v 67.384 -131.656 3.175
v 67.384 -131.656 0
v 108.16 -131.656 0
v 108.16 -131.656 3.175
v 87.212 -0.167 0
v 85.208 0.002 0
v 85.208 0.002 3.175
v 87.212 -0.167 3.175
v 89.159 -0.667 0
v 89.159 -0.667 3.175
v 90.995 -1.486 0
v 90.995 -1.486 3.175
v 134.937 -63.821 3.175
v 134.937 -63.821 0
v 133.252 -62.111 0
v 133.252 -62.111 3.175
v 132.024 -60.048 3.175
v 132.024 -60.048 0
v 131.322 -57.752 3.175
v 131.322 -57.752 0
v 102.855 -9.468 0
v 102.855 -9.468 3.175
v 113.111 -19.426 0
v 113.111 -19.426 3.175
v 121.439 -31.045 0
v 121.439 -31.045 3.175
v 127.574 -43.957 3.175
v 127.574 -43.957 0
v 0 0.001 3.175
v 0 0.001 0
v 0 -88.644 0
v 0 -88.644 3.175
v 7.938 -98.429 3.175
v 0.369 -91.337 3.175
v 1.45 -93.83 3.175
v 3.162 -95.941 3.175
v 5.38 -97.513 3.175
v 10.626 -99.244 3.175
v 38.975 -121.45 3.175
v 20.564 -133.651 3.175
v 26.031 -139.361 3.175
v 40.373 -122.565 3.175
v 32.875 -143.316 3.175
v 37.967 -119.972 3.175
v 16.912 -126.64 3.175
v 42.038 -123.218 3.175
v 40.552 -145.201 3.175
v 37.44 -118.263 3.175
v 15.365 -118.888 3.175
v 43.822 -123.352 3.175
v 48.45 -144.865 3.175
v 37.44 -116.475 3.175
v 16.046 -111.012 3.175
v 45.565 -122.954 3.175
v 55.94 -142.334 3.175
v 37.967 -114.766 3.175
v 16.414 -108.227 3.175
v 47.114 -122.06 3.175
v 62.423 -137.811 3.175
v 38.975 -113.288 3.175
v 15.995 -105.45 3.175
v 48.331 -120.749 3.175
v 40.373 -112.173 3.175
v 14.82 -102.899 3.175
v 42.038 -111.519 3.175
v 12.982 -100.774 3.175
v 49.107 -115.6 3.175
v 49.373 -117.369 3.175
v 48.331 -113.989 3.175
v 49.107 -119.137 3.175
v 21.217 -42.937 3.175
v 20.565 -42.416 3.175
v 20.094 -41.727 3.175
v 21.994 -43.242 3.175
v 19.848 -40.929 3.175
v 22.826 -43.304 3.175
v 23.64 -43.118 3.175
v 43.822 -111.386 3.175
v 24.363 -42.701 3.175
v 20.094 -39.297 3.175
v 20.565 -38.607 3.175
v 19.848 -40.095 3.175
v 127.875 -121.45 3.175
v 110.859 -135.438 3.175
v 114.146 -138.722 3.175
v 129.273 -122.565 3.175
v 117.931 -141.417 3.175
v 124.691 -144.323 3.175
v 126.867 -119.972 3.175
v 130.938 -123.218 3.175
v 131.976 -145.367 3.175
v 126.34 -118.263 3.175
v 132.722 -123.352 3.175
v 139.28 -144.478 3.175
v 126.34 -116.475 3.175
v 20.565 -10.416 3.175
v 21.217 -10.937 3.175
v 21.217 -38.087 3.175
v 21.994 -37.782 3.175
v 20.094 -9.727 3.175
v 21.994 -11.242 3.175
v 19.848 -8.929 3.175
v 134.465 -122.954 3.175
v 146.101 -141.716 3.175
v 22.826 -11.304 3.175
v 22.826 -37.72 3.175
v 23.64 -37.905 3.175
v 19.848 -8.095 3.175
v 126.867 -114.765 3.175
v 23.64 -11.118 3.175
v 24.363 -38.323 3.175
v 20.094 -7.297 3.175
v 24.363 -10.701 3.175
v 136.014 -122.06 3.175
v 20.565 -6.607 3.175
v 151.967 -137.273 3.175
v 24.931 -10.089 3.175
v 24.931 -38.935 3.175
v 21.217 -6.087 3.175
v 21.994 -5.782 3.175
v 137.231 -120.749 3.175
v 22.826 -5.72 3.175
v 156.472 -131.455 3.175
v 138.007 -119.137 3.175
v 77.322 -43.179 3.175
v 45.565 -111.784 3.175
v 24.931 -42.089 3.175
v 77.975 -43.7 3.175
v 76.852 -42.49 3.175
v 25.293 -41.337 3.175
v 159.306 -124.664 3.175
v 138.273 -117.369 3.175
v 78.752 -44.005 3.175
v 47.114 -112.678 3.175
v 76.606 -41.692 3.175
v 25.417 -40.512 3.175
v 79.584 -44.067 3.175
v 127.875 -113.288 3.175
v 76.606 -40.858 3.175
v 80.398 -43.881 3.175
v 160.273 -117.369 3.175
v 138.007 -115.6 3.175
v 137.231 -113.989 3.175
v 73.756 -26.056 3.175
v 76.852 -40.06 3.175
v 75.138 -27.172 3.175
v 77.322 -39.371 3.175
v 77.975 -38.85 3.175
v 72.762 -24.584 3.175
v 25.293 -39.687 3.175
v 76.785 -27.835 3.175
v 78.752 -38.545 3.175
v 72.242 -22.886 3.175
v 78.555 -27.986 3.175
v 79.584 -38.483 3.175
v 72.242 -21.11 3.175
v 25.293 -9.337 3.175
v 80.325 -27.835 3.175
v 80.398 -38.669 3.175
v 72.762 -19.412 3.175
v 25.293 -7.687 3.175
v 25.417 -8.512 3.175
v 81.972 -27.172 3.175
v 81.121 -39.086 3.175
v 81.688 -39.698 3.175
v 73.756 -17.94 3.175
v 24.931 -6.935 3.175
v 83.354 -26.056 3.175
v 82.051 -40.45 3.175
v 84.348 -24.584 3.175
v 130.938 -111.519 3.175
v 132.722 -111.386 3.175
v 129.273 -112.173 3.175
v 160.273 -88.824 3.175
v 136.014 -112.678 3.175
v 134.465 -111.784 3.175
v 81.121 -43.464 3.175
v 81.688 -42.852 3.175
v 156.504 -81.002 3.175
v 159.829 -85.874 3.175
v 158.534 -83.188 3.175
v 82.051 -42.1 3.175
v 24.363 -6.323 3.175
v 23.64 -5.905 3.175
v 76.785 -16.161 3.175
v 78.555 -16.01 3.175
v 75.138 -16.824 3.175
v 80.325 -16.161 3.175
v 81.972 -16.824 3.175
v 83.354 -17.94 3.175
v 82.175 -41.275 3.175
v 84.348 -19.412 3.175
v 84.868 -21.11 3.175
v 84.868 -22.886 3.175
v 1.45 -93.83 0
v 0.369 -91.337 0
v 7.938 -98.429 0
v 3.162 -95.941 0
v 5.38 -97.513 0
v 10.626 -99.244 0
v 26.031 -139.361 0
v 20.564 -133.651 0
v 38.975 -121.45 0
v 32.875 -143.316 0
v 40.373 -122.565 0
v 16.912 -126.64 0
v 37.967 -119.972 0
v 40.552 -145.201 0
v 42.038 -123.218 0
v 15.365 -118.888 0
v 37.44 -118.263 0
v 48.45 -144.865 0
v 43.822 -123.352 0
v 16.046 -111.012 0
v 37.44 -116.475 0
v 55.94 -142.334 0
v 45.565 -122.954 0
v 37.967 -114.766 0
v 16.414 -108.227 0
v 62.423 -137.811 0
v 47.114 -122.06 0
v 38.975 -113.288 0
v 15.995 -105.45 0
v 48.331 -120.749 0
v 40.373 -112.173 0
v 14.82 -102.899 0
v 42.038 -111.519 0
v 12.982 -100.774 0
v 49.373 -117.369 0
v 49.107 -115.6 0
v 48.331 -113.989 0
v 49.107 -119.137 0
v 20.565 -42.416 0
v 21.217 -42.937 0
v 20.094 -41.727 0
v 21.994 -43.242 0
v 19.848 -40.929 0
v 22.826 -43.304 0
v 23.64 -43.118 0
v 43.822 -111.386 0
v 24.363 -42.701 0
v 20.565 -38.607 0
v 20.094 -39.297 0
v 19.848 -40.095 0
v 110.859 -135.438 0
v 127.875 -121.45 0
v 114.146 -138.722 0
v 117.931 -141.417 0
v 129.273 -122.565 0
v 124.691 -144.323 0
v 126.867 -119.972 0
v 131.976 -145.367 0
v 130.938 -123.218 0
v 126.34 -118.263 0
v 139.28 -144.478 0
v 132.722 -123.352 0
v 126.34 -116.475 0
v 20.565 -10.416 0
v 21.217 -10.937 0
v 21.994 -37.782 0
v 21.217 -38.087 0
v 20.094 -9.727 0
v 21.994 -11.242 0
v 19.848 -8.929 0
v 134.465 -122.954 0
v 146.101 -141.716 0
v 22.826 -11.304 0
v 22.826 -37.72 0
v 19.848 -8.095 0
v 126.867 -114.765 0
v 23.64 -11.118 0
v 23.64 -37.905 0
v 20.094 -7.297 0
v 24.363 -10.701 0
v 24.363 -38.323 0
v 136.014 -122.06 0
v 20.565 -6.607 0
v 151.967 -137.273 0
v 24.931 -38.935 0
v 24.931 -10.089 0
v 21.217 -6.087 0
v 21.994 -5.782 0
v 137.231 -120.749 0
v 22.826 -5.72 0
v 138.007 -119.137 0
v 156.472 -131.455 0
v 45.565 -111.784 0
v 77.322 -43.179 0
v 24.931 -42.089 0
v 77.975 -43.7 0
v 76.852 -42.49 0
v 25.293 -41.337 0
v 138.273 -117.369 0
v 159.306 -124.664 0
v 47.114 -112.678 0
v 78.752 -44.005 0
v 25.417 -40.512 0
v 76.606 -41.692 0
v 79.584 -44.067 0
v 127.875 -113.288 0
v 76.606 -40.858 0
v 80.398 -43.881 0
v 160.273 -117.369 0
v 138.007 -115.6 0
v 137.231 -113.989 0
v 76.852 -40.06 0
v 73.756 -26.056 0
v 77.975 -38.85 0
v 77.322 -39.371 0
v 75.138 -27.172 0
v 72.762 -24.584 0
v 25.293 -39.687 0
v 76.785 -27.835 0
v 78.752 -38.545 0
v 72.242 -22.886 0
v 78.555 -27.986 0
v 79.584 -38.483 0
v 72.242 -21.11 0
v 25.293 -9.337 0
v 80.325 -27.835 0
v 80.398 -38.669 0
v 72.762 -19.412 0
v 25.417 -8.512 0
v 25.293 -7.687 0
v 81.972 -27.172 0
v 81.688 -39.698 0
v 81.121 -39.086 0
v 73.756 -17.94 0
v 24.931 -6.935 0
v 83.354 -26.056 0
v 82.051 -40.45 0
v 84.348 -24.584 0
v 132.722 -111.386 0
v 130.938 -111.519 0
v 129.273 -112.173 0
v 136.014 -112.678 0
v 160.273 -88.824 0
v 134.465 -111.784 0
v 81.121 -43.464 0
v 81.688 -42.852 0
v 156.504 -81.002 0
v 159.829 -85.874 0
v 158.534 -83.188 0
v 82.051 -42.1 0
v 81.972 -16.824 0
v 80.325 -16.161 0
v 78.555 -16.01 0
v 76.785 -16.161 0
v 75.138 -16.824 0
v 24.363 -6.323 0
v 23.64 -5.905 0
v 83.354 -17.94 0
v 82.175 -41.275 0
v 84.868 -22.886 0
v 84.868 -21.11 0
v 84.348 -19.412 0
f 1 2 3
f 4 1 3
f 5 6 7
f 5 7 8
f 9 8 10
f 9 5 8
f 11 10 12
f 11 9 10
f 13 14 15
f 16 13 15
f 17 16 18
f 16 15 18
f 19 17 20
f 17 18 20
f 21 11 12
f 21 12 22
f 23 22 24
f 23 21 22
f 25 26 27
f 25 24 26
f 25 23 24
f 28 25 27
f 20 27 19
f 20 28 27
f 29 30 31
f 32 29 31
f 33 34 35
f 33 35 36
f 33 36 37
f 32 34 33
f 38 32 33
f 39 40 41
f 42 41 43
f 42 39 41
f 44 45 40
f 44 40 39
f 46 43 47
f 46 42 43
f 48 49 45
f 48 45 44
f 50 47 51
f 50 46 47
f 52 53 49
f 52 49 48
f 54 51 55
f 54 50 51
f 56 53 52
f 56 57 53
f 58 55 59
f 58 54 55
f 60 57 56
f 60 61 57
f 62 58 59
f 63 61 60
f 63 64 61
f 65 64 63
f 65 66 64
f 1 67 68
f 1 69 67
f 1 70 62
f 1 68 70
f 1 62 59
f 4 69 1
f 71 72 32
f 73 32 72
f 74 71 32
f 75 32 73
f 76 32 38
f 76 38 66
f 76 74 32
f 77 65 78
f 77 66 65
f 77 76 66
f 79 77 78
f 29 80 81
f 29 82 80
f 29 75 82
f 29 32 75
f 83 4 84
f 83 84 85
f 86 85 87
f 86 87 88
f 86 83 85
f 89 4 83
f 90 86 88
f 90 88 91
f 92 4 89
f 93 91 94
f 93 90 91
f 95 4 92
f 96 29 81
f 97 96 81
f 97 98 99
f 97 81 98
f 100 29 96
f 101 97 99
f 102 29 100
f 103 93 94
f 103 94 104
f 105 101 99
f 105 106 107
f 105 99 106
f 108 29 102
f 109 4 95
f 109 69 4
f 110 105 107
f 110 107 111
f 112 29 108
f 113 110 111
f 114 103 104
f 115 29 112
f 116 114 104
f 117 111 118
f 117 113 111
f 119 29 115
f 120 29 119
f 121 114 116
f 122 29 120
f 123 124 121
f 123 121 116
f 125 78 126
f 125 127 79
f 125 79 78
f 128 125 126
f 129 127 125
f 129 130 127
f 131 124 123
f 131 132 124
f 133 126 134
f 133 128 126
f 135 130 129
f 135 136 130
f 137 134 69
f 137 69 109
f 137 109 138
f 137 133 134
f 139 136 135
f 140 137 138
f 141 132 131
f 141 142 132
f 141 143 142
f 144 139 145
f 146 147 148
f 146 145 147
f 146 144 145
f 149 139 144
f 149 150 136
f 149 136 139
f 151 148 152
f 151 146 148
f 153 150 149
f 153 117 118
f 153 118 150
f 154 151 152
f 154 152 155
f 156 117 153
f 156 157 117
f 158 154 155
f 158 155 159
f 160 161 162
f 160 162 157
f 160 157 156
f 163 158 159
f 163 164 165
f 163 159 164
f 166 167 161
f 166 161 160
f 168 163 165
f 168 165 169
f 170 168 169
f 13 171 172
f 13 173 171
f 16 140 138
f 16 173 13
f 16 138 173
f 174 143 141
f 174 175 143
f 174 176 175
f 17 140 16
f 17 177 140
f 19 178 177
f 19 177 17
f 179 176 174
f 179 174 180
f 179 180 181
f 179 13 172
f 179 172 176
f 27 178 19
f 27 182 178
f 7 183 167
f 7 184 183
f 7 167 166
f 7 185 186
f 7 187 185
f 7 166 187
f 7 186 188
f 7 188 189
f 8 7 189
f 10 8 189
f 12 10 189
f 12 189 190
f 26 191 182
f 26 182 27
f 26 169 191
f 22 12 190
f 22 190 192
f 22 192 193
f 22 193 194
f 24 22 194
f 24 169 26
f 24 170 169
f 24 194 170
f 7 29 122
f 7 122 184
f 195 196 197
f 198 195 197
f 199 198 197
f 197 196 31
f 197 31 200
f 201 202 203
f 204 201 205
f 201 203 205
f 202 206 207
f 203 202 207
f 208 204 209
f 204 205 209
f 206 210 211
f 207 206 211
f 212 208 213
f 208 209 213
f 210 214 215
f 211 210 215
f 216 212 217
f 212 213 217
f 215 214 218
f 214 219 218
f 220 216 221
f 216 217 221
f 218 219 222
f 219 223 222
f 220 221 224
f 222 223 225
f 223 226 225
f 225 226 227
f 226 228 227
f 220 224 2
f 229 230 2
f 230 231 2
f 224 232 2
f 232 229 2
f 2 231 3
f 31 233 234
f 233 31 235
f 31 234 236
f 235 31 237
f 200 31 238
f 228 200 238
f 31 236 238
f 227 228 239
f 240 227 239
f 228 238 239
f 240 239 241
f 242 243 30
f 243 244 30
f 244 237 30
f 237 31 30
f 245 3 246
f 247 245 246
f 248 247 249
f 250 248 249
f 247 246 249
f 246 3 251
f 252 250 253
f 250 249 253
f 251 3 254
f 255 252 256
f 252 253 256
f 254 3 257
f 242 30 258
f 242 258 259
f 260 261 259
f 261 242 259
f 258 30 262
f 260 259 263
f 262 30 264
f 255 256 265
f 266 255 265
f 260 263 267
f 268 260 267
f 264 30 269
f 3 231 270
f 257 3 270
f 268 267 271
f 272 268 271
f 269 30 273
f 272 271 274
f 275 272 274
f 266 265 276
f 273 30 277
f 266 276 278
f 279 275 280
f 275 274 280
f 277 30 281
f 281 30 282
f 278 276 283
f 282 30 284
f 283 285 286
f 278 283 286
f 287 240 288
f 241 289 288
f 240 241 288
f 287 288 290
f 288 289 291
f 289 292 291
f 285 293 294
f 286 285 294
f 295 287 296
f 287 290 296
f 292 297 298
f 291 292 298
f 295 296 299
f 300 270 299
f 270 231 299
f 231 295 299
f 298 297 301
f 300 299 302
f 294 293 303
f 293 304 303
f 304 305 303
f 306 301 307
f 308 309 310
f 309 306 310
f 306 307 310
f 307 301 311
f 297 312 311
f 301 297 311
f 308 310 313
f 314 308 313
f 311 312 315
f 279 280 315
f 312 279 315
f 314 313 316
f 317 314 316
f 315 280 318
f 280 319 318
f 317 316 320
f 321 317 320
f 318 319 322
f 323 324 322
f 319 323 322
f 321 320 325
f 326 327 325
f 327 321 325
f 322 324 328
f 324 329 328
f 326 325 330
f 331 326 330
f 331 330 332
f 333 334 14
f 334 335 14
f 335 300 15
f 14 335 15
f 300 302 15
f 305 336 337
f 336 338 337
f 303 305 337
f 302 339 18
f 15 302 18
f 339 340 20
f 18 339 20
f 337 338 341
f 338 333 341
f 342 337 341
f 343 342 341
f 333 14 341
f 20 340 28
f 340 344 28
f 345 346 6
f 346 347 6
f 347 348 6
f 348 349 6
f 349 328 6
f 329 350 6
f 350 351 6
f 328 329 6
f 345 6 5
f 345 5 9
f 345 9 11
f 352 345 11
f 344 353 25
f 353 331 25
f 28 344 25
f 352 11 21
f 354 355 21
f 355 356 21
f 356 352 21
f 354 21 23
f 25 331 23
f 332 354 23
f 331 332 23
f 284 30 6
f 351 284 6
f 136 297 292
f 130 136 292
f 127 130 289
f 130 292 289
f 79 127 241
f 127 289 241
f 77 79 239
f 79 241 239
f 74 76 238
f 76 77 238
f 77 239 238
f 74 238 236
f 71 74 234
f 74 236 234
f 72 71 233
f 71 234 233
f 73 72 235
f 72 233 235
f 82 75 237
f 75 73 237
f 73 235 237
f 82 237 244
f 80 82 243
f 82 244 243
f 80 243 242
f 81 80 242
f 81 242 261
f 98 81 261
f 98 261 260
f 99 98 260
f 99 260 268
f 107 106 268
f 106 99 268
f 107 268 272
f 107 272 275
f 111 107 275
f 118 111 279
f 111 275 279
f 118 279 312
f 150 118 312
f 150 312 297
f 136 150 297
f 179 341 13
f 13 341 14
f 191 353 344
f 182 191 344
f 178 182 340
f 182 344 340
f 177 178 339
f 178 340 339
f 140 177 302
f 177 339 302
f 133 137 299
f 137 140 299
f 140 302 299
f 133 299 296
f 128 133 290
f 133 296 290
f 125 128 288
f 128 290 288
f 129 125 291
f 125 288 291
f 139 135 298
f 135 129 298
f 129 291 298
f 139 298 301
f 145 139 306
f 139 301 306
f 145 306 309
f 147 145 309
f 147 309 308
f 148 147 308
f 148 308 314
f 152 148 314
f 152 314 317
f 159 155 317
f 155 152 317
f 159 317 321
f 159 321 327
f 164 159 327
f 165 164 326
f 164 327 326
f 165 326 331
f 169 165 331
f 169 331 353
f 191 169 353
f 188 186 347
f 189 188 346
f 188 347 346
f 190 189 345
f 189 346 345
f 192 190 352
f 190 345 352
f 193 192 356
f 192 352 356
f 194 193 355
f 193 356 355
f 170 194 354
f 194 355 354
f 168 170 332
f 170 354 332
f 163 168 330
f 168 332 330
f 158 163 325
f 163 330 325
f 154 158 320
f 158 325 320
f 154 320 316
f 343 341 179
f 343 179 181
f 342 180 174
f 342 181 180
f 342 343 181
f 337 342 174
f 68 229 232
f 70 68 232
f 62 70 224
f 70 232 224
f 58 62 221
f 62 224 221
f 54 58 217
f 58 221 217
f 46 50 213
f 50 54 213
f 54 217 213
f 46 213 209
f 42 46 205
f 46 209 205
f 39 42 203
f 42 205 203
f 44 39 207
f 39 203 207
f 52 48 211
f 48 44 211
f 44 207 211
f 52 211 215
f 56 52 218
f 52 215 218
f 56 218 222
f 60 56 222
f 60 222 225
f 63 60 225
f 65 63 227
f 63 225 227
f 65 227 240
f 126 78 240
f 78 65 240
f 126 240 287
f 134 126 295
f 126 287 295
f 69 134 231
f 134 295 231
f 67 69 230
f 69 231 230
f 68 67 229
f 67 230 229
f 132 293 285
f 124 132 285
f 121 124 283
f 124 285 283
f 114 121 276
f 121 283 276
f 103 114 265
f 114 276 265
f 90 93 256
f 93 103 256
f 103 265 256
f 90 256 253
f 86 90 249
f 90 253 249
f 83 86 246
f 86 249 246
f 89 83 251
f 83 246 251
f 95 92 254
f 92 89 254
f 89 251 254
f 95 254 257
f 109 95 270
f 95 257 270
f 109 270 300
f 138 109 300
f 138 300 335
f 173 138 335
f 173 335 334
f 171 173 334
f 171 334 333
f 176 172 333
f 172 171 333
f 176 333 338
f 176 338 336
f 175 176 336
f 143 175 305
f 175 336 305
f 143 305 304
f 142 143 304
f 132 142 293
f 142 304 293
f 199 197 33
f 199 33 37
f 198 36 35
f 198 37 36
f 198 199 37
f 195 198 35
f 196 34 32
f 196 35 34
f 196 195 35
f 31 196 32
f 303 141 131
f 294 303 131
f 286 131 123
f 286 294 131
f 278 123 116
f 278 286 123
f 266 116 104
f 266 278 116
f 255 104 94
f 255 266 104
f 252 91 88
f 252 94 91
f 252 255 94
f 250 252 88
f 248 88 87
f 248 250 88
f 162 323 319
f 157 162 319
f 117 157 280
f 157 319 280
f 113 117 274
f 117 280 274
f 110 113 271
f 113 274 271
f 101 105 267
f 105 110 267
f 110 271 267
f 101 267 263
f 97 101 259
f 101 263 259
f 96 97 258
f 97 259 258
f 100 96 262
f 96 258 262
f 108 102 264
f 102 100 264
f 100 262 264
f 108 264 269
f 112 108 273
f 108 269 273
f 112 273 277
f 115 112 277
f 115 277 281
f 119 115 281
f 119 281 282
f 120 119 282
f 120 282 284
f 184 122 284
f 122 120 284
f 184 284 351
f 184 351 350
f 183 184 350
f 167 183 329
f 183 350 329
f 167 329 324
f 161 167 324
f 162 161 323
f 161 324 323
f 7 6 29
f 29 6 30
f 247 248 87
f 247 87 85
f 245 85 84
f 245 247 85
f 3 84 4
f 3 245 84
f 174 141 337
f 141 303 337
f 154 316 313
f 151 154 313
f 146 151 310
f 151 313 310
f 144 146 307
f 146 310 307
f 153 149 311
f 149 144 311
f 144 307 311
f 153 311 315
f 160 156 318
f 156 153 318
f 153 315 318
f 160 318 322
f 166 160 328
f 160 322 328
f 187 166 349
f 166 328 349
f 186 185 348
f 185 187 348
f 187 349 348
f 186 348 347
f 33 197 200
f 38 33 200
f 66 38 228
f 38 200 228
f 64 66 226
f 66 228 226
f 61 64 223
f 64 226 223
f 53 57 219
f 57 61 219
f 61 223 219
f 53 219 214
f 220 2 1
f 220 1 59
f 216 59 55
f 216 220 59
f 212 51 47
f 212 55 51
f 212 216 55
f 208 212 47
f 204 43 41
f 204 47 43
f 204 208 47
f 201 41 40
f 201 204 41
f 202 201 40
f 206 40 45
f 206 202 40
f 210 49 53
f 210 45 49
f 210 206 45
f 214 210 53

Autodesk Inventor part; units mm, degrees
ref_plane "YZ Plane" through (0, 0, 0) normal (1, 0, 0) x (0, 1, 0)
ref_plane "XZ Plane" through (0, 0, 0) normal (0, 1, 0) x (-1, 0, 0)
ref_plane "XY Plane" through (0, 0, 0) normal (0, 0, 1) x (1, 0, 0)
sketch "Sketch1" plane through (0, 0, 0) normal (0, 0, 1) x (1, 0, 0)
  line L0 (90.4273, 0.002) -> (0, 0.002)
  line L1 (0, 0.002) -> (0, -88.6441)
  arc A0 (0, -88.6441) -> (7.9382, -98.4293) centre (10, -88.6441) ccw
  arc A1 (16.0457, -111.012) -> (7.9382, -98.4293) centre (6.4076, -108.3189) ccw
  arc A2 (145.7944, -114.2869) -> (148.0953, -110.4201) centre (146.9707, -112.3688) ccw
  circle A3 centre (97.4707, -122.3689) radius 2.25
  circle A4 centre (97.4707, -112.3689) radius 2.25
  circle A5 centre (78.1758, -122.3689) radius 2.25
  arc A6 (145.7944, -124.2869) -> (148.0953, -120.4201) centre (146.9707, -122.3689) ccw
  circle A7 centre (22.6171, -8.5119) radius 2.8
  circle A8 centre (22.6171, -40.5119) radius 2.8
  circle A9 centre (28.6758, -122.3689) radius 2.25
  circle A10 centre (28.6758, -112.3689) radius 2.25
  circle A11 centre (78.1758, -112.3689) radius 2.25
  circle A12 centre (78.9344, -21.998) radius 3.25
  circle A13 centre (10, -90.6616) radius 3.3
  line L2 (73.0605, -128.2915) -> (33.527, -128.2915)
  arc A14 (32.527, -127.2915) -> (33.527, -128.2915) centre (33.527, -127.2915) ccw
  line L3 (32.527, -127.2915) -> (32.527, -107.4915)
  arc A15 (33.527, -106.4915) -> (32.527, -107.4915) centre (33.527, -107.4915) ccw
  line L4 (33.527, -106.4915) -> (73.0605, -106.4915)
  arc A16 (74.0605, -107.4915) -> (73.0605, -106.4915) centre (73.0605, -107.4915) ccw
  line L5 (74.0605, -107.4915) -> (74.0605, -127.2915)
  arc A17 (73.0605, -128.2915) -> (74.0605, -127.2915) centre (73.0605, -127.2915) ccw
  line L6 (142.1195, -128.2915) -> (102.586, -128.2915)
  arc A18 (101.586, -127.2915) -> (102.586, -128.2915) centre (102.586, -127.2915) ccw
  line L7 (101.586, -127.2915) -> (101.586, -107.4915)
  arc A19 (102.586, -106.4915) -> (101.586, -107.4915) centre (102.586, -107.4915) ccw
  line L8 (102.586, -106.4915) -> (142.1195, -106.4915)
  arc A20 (143.1195, -107.4915) -> (142.1195, -106.4915) centre (142.1195, -107.4915) ccw
  line L9 (143.1195, -107.4915) -> (143.1195, -127.2915)
  arc A21 (142.1195, -128.2915) -> (143.1195, -127.2915) centre (142.1195, -127.2915) ccw
  circle A22 centre (146.9707, -112.3688) radius 2.25
  circle A23 centre (146.9707, -122.3689) radius 2.25
  line L10 (28.6758, -112.3689) -> (146.9707, -112.3688) construction
  line L11 (28.6758, -122.3689) -> (146.9707, -122.3689) construction
  circle A24 centre (43.3732, -117.3689) radius 5.9 construction
  circle A25 centre (132.2732, -117.3688) radius 5.9 construction
  circle A26 centre (43.3732, -117.3689) radius 6
  circle A27 centre (132.2732, -117.3688) radius 6
  line L12 (10, -90.6616) -> (176.2125, -90.6616) construction
  circle A28 centre (78.9344, -21.998) radius 6
  circle A29 centre (79.375, -41.275) radius 2.8
  line L13 (0.0516, 0) -> (0, 0) projected
  line L14 (0, 0) -> (0, -88.6441) projected
  arc A30 (0, -88.6441) -> (8.2038, -98.4815) centre (10, -88.6441) ccw projected
  arc A31 (16.1218, -110.6924) -> (8.2038, -98.4815) centre (6.4076, -108.3189) ccw projected
  arc A32 (16.1218, -110.6924) -> (67.3839, -131.6564) centre (43.3217, -117.3382) ccw projected
  line L15 (67.3839, -131.6564) -> (108.1595, -131.6564) projected
  arc A33 (108.1595, -131.6564) -> (117.931, -141.4167) centre (132.2217, -117.3382) ccw projected
  arc A34 (117.931, -141.4167) -> (160.2733, -117.3688) centre (132.2732, -117.3688) ccw projected
  line L16 (160.2733, -117.3688) -> (160.2733, -88.8237) projected
  arc A35 (160.2733, -88.8237) -> (156.504, -81.0021) centre (150.2733, -88.8237) ccw projected
  line L17 (156.504, -81.0021) -> (134.9366, -63.8213) projected
  arc A36 (131.3222, -57.7523) -> (134.9366, -63.8213) centre (141.1674, -55.9997) ccw projected
  arc A37 (131.3222, -57.7523) -> (90.9953, -1.4859) centre (52.2705, -71.825) ccw projected
  arc A38 (90.9953, -1.4859) -> (85.2079, 0.002) centre (85.2079, -11.998) ccw projected
  line L18 (85.2079, 0.002) -> (0.0516, 0.002) projected
  line L19 (0.0516, 0.002) -> (0.0516, 0) projected
  circle A39 centre (155.0516, -88.6441) radius 3.3 projected
  line L20 (102.586, -106.4915) -> (142.1195, -106.4915) projected
  arc A40 (143.1195, -107.4915) -> (142.1195, -106.4915) centre (142.1195, -107.4915) ccw projected
  line L21 (143.1195, -107.4915) -> (143.1195, -127.2915) projected
  arc A41 (142.1195, -128.2915) -> (143.1195, -127.2915) centre (142.1195, -127.2915) ccw projected
  line L22 (142.1195, -128.2915) -> (102.586, -128.2915) projected
  arc A42 (101.586, -127.2915) -> (102.586, -128.2915) centre (102.586, -127.2915) ccw projected
  line L23 (101.586, -127.2915) -> (101.586, -107.4915) projected
  arc A43 (102.586, -106.4915) -> (101.586, -107.4915) centre (102.586, -107.4915) ccw projected
  line L24 (74.0605, -107.4915) -> (74.0605, -127.2915) projected
  arc A44 (73.0605, -128.2915) -> (74.0605, -127.2915) centre (73.0605, -127.2915) ccw projected
  line L25 (73.0605, -128.2915) -> (33.527, -128.2915) projected
  arc A45 (32.527, -127.2915) -> (33.527, -128.2915) centre (33.527, -127.2915) ccw projected
  line L26 (32.527, -127.2915) -> (32.527, -107.4915) projected
  arc A46 (33.527, -106.4915) -> (32.527, -107.4915) centre (33.527, -107.4915) ccw projected
  line L27 (33.527, -106.4915) -> (73.0605, -106.4915) projected
  arc A47 (74.0605, -107.4915) -> (73.0605, -106.4915) centre (73.0605, -107.4915) ccw projected
  circle A48 centre (28.6758, -112.3689) radius 2.25 projected
  circle A49 centre (28.6758, -122.3689) radius 2.25 projected
  circle A50 centre (78.1758, -21.998) radius 6 projected
  circle A51 centre (78.1758, -122.3689) radius 2.25 projected
  circle A52 centre (97.4707, -112.3689) radius 2.25 projected
  circle A53 centre (146.9707, -112.3688) radius 2.25 projected
  circle A54 centre (146.9707, -122.3689) radius 2.25 projected
  circle A55 centre (22.6171, -8.5119) radius 2.8 projected
  circle A56 centre (22.6171, -40.5119) radius 2.8 projected
  circle A57 centre (97.4707, -122.3689) radius 2.25 projected
  circle A58 centre (78.1758, -112.3689) radius 2.25 projected
  circle A59 centre (10, -88.6441) radius 3.3 projected
  point P0 (0, 0)
  point P1 (58.8546, -117.3689)
  point P2 (148.0953, -110.4201)
  point P3 (151.6186, -98.07)
  point P4 (85.2079, 0.002)
  point P5 (13.142, -89.6529)
  point P6 (6.858, -89.6529)
  point P7 (78.5551, -27.986)
  point P8 (78.5551, -16.01)
  dimension "d2" = 49.5
  dimension "d3" = 49.5
  dimension "d4" = 49.5
  dimension "d5" = 49.5
  dimension "d6" = 10
  dimension "d7" = 12
  dimension "d8" = 12
  dimension "d9" = 6.6
  dimension "d10" = 10
  dimension "d12" = 10
  dimension "d16" = 12
  dimension "d17" = 5.6
  dimension "d18" = 22
extrude "Extrusion1" add sketch "Sketch1" along normal blind 3.175 contours A38 A37 A36 L17 A35 L16 A34 A33 L15 A32 A1 A0 L1 L0 | A22 A2 | A3 | A4 | A5 | A23 A6 | A9 | A10 | A11 | A13 A59 | A59 A13 | A13 A59 | L2 A14 L3 A15 L4 A16 L5 A17 | L6 A18 L7 A19 L8 A20 L9 A21 | A39
properties part number "Intake Sides V4_bearing" material "Polycarbonate, Clear"
